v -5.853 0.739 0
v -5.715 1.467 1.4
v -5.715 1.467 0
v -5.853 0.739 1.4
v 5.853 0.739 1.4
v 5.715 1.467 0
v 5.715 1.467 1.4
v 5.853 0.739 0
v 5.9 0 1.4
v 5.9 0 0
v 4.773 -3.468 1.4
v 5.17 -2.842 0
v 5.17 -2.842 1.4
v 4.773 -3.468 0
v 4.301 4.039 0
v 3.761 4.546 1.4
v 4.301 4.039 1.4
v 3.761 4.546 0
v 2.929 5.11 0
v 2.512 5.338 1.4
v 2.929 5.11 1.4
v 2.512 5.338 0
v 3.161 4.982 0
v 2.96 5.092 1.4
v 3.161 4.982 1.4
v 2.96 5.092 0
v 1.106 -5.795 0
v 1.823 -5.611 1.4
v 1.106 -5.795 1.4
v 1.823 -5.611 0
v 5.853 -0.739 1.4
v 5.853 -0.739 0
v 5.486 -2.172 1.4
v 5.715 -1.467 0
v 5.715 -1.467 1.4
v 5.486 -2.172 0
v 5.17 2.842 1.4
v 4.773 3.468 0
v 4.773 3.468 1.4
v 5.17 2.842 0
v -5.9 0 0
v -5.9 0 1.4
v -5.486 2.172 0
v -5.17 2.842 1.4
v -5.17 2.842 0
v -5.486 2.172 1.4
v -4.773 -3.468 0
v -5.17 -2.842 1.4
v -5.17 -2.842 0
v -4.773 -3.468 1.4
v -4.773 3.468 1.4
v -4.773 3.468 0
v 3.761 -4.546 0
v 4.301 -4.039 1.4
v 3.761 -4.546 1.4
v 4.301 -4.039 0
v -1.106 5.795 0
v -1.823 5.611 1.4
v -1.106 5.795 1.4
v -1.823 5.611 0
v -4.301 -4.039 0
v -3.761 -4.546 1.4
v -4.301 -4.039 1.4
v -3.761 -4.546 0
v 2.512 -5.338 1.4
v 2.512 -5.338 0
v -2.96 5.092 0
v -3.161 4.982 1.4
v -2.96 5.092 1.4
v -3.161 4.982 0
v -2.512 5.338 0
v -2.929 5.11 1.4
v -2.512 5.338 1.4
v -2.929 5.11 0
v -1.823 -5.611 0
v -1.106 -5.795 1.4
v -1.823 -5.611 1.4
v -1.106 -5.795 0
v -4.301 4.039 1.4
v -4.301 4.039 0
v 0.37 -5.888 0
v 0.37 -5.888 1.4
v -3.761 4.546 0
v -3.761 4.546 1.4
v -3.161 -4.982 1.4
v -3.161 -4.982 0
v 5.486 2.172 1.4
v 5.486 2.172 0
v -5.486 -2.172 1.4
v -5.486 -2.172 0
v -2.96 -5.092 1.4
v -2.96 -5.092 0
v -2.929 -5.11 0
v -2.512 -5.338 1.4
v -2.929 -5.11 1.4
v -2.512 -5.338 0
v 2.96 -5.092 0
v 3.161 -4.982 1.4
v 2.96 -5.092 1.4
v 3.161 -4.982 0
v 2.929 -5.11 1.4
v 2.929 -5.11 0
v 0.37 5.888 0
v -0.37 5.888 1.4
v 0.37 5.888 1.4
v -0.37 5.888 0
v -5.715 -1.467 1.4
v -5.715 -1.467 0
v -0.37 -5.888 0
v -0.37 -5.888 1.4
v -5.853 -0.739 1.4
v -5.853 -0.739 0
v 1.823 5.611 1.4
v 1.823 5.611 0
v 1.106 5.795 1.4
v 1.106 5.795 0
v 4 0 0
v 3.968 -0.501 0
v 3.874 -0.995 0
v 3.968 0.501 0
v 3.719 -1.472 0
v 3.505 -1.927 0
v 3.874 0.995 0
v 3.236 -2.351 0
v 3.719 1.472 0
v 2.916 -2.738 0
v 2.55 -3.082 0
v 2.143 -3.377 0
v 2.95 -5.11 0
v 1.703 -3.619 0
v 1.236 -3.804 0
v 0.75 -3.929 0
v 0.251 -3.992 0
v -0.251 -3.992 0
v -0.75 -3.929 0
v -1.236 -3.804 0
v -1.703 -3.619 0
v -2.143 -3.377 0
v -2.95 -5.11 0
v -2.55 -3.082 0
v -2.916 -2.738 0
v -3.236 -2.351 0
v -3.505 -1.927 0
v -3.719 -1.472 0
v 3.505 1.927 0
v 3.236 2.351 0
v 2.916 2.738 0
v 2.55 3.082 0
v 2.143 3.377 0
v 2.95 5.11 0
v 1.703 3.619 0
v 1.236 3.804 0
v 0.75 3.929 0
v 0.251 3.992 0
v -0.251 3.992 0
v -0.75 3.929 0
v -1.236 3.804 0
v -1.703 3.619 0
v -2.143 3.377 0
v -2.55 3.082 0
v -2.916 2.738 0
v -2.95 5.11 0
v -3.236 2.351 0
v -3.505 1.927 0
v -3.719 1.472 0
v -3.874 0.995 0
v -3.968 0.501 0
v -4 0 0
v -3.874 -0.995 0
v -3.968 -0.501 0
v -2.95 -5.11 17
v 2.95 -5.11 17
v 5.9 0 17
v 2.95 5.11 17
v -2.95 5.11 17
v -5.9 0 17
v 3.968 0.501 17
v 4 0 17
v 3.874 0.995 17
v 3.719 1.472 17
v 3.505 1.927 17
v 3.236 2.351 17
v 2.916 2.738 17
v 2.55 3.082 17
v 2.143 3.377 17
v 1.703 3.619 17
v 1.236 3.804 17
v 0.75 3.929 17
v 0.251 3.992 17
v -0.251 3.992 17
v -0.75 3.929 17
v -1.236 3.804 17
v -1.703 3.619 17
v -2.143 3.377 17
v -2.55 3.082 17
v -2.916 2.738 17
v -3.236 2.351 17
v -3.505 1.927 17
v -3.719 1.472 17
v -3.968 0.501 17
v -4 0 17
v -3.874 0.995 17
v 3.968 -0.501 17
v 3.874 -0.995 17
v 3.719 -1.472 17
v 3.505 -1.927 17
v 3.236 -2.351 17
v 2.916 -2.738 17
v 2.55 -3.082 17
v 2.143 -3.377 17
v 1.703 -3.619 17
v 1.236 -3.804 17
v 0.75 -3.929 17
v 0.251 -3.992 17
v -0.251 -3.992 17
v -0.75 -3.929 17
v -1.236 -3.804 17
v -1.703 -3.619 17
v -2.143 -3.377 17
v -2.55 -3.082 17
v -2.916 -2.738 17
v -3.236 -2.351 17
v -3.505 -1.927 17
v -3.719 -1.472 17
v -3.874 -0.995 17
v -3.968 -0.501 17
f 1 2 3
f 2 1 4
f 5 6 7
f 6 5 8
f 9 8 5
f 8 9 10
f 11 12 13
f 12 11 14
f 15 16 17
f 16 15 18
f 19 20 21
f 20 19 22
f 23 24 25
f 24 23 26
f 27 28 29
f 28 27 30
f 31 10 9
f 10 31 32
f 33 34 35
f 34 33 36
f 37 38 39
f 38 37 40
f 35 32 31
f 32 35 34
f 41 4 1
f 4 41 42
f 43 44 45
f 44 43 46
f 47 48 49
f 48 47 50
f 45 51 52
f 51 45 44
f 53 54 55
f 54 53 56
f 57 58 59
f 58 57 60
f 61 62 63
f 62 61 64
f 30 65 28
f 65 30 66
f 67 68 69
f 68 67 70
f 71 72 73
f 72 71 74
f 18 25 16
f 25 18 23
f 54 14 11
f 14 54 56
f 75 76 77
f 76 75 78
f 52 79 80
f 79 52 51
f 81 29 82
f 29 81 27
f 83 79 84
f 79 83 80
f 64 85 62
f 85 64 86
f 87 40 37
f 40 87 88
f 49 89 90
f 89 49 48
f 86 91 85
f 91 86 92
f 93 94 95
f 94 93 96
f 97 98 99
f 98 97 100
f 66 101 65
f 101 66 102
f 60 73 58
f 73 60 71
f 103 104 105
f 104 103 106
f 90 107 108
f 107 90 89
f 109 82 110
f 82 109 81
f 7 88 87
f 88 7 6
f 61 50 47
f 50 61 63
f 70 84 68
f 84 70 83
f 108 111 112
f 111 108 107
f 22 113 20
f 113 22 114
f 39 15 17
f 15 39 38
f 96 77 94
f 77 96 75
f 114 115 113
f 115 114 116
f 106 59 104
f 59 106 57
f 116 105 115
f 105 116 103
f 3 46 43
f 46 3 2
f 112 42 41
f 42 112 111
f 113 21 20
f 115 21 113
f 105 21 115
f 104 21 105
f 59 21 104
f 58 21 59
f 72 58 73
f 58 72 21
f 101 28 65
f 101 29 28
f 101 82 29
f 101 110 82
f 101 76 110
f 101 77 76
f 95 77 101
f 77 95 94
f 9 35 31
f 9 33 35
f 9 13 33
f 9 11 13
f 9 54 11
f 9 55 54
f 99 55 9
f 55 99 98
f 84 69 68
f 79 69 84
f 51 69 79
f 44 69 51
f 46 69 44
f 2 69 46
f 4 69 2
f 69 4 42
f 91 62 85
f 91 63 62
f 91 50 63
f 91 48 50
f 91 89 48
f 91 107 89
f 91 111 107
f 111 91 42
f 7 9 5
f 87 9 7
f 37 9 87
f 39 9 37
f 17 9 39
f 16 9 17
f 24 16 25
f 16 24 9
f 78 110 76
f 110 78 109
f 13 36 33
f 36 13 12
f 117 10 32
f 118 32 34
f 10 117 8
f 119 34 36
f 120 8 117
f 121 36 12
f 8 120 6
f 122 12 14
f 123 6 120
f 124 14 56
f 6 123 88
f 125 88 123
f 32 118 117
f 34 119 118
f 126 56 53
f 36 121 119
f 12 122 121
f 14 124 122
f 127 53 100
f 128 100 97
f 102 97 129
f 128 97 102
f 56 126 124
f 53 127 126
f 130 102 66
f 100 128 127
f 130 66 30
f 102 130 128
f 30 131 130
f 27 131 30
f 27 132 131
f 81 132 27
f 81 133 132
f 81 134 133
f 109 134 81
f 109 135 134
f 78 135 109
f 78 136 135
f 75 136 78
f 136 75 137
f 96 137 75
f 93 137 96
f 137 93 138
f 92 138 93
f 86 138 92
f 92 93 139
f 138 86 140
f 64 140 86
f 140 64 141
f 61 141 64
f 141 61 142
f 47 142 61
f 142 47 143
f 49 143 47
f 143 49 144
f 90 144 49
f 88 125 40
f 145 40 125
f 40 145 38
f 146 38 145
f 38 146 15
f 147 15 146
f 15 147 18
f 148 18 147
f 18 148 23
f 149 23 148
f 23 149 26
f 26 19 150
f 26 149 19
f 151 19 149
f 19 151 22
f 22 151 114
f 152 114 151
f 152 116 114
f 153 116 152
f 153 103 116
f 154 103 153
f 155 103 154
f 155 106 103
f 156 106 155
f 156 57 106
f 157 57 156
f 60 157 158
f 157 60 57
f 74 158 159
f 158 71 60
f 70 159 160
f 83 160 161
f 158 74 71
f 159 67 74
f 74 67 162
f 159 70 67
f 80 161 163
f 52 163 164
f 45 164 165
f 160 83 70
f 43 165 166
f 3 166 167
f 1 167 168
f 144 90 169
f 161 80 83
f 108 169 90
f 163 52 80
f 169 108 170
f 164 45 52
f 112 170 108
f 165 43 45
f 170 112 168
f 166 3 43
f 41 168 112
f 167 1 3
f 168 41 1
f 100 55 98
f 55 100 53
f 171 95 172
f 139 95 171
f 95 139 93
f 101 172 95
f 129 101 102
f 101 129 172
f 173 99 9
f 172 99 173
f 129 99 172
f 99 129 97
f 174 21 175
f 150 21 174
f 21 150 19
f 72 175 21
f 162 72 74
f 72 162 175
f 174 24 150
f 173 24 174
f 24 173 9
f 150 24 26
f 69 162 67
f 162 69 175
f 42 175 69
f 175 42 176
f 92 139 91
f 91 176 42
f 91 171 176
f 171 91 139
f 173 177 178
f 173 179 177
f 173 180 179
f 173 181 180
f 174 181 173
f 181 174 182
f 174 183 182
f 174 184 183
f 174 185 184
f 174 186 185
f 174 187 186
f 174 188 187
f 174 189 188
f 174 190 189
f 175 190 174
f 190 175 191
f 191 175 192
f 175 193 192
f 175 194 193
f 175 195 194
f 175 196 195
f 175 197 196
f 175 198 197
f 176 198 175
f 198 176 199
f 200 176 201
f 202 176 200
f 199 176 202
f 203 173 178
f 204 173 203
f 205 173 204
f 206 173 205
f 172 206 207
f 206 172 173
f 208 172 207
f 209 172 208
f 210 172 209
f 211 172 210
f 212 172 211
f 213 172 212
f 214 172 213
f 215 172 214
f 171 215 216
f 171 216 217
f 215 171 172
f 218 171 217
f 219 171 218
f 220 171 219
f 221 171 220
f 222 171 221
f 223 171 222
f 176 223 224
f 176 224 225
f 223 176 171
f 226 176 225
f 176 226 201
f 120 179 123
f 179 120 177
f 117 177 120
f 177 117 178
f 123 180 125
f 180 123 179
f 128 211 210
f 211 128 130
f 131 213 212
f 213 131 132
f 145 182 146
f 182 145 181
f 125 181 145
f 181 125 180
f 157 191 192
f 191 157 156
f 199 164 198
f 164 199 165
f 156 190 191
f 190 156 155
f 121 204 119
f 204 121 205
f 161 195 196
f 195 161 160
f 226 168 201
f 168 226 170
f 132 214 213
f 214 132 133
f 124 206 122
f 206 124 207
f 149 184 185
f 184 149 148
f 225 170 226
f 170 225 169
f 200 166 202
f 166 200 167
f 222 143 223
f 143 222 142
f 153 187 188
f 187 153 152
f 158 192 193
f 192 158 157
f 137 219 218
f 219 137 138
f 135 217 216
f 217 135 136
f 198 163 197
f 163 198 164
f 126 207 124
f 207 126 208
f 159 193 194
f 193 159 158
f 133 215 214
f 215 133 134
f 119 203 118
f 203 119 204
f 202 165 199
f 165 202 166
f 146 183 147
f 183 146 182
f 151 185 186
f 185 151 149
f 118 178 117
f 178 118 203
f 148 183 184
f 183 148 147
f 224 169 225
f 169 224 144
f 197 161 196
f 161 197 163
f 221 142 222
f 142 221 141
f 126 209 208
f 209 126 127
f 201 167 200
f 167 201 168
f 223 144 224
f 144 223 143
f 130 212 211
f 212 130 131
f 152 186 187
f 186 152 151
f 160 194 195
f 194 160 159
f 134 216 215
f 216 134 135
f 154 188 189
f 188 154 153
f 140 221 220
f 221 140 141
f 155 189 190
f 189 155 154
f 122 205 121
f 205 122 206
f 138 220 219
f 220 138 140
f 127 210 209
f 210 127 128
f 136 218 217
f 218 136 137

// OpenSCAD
// file: ../shapes.scad
module roundedCube(size, radius, center = false) {
  translate([center ? -(size[0] / 2) : 0, center ? -(size[1] / 2) : 0, center ? -(size[2] / 2) : 0]) {
    translate([radius, radius, 0]) cube([size[0] - radius * 2, size[1] - radius * 2, size[2]]);

    for (y = [0:1]) {
      for (x = [0:1]) {
        translate([x * (size[0] - radius * 2) + radius, y * (size[1] - radius * 2) + radius, 0]) cylinder(r=radius, h=size[2]);
      }
    }

    for (i = [0:1]) {
      translate([i * (size[0] - radius), radius, 0]) cube([radius, size[1] - radius * 2, size[2]]);
      translate([radius, i * (size[1] - radius), 0]) cube([size[0] - radius * 2, radius, size[2]]);
    }
  }
}
// file: tile.scad
include <const.scad>
use <../shapes.scad>

tile();

module tile() {
  roundedCube([tile_width, tile_height, tile_depth], radius=tile_radius, $fn=20);
}
// file: const.scad
tolerance = .2;
shift = 1;

tile_width = 14.2;
tile_height = 45;
tile_depth = 2.2;
tile_radius = 2;

holder_edge = 2;
holder_width = tile_width + holder_edge + 5 * tolerance;
holder_height = tile_height + holder_edge + 5 * tolerance;
holder_depth = tile_depth + holder_edge + 5 * tolerance;

rod_radius = 4;

link_indent = 1.6;
link_innerradius = 4;
link_outerradius = 6;

base_edge = 4;

foot_height = 1;
foot_radius = 2;
// main file
include <const.scad>
use <tile.scad>

link();

module link() {
  difference() {
    union() {
      cylinder(r=link_outerradius - tolerance / 2, h=link_indent - tolerance, $fn=50);
      cylinder(r=link_outerradius - tolerance / 2, h=holder_width - tolerance, $fn=6);
    }

    translate([0, 0, -shift / 2]) cylinder(r=link_innerradius, h=holder_width - tolerance + shift, $fn=50);
  }
}
